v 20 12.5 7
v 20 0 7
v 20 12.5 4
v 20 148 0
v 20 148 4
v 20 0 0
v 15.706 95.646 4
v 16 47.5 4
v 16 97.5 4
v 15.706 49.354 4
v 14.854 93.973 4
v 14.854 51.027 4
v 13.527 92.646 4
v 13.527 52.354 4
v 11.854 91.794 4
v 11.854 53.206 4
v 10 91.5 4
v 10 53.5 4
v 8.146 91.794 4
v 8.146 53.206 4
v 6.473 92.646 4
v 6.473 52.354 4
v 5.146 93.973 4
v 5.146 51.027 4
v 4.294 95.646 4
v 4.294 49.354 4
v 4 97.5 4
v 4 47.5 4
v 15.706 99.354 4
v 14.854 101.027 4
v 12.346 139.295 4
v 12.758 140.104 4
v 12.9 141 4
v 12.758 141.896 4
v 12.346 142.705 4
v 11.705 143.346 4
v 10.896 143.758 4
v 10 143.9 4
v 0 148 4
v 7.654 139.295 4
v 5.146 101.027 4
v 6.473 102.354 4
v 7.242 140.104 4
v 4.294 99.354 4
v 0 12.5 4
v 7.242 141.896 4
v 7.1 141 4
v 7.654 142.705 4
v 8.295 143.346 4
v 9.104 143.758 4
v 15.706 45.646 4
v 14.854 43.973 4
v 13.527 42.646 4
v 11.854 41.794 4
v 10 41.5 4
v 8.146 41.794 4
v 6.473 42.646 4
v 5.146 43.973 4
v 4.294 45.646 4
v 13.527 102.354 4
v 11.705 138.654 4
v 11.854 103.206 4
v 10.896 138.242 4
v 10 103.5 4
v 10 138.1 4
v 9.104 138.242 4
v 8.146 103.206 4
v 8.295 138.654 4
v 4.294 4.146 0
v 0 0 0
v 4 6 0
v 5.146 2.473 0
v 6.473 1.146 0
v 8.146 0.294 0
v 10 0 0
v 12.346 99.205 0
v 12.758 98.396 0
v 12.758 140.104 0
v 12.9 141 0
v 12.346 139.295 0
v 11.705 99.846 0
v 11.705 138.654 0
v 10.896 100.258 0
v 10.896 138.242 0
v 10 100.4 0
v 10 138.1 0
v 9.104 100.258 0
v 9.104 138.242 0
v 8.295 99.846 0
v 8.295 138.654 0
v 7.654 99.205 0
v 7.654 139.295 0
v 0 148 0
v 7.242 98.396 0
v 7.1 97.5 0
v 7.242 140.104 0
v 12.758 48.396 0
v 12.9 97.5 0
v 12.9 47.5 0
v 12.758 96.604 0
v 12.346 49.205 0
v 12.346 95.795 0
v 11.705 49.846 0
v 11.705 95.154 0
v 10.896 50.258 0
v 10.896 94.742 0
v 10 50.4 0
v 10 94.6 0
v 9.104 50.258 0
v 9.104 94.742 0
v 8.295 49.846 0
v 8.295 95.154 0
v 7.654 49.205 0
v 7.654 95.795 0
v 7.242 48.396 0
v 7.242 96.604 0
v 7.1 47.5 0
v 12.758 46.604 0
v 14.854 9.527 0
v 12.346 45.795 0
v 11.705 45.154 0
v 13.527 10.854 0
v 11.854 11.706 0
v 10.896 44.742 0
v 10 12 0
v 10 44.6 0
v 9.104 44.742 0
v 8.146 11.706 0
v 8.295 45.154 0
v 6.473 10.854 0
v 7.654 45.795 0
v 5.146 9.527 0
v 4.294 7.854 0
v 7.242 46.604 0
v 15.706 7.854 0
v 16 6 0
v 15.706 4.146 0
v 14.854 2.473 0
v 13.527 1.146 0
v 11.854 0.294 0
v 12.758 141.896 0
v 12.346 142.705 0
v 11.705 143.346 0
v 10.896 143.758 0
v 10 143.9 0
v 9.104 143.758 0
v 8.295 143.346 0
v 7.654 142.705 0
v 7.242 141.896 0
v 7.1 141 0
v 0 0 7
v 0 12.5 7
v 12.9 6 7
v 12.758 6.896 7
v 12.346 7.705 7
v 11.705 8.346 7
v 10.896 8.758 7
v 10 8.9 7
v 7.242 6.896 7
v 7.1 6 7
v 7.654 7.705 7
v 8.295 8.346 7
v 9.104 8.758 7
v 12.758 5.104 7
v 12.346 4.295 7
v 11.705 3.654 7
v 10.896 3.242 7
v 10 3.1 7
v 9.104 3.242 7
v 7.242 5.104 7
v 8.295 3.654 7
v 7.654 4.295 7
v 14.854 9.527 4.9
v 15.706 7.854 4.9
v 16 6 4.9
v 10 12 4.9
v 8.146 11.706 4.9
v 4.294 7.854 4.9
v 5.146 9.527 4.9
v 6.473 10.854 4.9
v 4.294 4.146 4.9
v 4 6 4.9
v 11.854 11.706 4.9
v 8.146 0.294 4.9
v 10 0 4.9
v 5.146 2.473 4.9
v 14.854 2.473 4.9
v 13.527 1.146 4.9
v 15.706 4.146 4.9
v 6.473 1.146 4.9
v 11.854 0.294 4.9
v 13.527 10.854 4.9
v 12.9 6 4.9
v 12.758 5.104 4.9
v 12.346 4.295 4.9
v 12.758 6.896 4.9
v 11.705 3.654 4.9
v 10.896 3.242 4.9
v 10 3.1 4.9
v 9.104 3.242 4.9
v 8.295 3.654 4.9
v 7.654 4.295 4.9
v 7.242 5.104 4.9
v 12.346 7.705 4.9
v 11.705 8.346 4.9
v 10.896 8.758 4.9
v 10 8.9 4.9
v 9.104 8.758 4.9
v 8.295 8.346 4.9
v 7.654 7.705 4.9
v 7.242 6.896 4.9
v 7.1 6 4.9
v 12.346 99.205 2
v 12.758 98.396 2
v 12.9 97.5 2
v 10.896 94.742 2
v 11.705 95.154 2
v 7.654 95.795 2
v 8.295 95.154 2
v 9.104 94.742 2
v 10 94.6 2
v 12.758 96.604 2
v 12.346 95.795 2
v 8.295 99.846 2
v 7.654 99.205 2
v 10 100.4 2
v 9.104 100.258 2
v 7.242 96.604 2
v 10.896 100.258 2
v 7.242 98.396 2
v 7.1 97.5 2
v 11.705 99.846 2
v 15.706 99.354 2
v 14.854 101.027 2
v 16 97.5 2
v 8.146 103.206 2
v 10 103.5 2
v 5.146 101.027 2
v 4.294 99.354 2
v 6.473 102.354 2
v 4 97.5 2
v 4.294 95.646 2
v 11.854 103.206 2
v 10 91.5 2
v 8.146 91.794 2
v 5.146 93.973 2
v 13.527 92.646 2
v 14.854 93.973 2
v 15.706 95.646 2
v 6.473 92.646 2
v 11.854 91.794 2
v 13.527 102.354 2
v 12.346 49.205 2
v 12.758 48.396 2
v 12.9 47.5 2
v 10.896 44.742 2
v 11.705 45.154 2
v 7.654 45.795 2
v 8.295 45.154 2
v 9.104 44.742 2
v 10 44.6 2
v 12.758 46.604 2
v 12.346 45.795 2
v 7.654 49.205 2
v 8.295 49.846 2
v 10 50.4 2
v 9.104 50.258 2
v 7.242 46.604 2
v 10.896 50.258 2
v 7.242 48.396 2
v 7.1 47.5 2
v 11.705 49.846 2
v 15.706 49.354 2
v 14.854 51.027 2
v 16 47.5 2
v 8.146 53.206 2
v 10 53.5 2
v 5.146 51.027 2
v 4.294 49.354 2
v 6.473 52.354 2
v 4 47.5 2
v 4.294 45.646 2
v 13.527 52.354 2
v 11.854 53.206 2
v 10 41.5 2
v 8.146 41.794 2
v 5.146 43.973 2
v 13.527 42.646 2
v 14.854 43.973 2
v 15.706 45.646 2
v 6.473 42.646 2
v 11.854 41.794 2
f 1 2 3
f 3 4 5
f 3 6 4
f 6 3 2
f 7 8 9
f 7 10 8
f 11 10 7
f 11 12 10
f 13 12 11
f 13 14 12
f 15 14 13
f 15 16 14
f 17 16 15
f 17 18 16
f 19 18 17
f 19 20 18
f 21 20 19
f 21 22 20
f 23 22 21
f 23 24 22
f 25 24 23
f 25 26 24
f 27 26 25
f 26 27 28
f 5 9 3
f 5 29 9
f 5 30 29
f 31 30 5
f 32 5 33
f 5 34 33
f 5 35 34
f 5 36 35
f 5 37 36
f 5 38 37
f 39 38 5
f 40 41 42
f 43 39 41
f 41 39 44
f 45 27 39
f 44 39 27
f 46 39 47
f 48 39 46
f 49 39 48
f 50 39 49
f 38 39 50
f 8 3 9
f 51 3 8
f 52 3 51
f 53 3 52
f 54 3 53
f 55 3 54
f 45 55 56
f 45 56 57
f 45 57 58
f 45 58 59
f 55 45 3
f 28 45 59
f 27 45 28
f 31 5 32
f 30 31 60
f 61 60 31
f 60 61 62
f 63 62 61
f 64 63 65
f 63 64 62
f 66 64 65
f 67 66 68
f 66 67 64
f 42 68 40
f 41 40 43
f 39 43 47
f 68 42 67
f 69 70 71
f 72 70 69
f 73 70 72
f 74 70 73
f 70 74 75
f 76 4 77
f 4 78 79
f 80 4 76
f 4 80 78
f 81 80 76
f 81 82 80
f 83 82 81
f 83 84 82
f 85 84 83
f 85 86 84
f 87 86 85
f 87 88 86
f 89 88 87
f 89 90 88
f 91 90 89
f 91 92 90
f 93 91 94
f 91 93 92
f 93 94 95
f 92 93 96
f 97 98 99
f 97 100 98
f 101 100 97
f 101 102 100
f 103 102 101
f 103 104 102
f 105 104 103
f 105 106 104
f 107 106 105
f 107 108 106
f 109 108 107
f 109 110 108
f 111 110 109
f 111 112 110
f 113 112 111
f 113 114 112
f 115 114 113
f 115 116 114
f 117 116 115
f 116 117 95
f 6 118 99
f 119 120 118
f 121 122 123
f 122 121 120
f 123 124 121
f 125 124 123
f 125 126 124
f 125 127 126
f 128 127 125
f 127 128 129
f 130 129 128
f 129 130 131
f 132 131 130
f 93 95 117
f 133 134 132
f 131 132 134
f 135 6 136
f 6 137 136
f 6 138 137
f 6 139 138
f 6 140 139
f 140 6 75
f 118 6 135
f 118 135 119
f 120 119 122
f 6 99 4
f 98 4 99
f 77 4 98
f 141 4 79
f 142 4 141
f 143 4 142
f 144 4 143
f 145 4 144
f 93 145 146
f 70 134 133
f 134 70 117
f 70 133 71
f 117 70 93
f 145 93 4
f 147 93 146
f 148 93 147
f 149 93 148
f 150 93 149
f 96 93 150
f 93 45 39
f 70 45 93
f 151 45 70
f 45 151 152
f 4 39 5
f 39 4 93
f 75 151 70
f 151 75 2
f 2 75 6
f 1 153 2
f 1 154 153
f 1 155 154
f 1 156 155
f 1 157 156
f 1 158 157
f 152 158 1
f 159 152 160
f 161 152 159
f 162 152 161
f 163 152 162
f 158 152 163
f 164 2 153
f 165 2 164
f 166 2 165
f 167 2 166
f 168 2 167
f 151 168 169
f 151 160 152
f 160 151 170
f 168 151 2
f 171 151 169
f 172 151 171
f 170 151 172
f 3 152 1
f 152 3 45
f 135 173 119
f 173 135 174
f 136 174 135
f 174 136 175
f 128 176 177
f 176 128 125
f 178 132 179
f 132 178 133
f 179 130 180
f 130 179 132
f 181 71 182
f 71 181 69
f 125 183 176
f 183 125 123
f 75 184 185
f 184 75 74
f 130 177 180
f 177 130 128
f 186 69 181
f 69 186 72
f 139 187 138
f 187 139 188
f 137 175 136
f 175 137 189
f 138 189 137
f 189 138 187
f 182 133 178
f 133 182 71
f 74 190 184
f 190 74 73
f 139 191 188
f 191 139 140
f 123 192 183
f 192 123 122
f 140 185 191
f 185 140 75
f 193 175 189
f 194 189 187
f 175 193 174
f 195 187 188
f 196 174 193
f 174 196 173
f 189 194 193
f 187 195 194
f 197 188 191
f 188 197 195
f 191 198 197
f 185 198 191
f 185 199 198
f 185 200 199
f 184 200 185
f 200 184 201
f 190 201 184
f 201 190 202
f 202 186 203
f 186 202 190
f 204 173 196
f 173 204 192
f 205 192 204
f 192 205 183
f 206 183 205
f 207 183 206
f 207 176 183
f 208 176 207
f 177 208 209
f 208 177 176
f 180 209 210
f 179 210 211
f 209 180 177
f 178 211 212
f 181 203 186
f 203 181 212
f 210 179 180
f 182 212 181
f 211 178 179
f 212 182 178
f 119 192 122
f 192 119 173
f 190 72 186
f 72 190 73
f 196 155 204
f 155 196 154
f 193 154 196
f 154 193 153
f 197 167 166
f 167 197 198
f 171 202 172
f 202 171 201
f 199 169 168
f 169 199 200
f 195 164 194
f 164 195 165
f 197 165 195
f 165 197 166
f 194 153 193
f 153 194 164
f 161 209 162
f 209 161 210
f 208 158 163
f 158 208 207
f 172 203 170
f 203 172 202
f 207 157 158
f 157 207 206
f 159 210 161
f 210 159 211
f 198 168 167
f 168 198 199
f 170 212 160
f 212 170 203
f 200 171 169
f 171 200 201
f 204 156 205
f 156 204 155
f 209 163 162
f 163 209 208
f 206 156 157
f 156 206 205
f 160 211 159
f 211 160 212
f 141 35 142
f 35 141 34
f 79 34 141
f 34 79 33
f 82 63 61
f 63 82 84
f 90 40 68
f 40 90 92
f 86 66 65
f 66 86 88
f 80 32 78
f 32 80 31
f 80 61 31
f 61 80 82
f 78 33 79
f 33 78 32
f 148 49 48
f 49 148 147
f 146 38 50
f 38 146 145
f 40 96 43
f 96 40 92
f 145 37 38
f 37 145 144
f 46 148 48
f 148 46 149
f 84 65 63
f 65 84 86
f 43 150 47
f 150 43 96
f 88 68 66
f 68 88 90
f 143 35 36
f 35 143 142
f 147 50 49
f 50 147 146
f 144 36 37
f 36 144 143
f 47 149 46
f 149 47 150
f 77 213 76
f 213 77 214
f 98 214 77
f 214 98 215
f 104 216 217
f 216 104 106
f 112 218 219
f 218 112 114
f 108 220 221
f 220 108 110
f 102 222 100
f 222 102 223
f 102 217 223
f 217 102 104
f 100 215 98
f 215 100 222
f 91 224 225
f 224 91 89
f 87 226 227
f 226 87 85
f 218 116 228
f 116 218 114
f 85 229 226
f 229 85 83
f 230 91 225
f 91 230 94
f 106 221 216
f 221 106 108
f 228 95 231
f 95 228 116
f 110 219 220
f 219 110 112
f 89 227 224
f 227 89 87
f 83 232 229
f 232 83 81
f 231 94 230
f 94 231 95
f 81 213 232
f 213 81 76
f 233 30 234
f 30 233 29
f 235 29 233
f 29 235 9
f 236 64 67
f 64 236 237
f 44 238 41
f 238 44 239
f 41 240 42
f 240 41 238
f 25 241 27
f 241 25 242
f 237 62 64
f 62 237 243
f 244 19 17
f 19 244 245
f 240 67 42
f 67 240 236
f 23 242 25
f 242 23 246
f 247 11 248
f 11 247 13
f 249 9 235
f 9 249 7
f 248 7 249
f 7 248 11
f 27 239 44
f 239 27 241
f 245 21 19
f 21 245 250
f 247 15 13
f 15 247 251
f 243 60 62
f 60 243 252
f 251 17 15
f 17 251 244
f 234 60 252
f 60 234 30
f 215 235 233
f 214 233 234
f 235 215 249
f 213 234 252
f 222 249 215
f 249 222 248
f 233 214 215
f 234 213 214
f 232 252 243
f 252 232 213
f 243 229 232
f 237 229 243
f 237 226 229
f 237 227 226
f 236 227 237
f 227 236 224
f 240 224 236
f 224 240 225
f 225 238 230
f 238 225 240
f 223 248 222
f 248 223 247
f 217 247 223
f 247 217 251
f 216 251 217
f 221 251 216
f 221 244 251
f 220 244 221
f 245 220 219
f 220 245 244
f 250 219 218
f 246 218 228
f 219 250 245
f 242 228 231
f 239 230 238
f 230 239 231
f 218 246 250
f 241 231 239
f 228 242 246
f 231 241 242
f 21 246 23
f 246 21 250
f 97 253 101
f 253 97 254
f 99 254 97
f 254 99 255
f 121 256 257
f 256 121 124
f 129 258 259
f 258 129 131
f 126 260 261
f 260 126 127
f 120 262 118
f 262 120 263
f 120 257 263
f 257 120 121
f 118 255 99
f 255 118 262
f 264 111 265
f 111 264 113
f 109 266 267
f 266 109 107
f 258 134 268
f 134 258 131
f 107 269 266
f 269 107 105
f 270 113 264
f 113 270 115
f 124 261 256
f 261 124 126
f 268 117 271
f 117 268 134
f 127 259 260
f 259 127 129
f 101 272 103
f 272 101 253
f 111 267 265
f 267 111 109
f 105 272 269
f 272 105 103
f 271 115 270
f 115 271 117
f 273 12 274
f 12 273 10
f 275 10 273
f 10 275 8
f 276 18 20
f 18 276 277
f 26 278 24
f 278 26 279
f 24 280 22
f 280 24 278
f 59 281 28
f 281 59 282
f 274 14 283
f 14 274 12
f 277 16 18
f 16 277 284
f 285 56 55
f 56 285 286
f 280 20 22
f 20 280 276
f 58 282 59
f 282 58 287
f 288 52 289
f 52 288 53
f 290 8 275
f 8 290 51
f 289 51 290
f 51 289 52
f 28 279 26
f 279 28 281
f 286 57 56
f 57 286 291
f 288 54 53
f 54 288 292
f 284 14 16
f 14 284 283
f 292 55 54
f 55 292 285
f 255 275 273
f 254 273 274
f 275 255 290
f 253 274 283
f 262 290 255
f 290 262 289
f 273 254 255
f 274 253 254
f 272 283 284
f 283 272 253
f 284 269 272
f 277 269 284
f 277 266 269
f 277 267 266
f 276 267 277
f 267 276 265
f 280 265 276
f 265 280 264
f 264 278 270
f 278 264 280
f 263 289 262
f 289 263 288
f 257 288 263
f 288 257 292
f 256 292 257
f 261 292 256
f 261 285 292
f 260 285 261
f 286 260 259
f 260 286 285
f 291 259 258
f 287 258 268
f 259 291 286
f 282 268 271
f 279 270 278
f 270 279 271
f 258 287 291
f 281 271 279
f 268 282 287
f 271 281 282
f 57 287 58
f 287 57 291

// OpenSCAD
//psu_cover_switched_openscader();

psu_clamp();

module psu_clamp(){
difference(){
union(){
cube([20,148,4]);
cube([20,12.5,4+3]);
}
g = 6;
translate([10,g,-0.1])cylinder(r=12/2,h=5,$fn=20);
translate([10,g,-5])cylinder(r=5.8/2,h=30,$fn=20);
#translate([10,g+125+10,-5])cylinder(r=5.8/2,h=30,$fn=20);
translate([10,((145)/2)+25,-5])cylinder(r=5.8/2,h=30,$fn=20);
translate([10,((145)/2)+25,2])#cylinder(r=12/2,h=2,$fn=20);
translate([10,((145)/2)-25,-5])cylinder(r=5.8/2,h=30,$fn=20);
translate([10,((145)/2)-25,2])cylinder(r=12/2,h=2,$fn=20);
}
}

module psu_cover_switched_openscader(){
//#rotate([90,0,0])import("PSU_Fused_Switch_Cover.stl");
difference(){
union(){
translate([-59,-33,0])color("pink")cube([118,74,2]);
translate([-59,-33,0])color("pink")cube([2,74+5,2+53]);
translate([-59+116,-33,0])color("pink")cube([2,74+5,2+53]);
translate([-59,-33,0])color("pink")cube([118,2,2+50]);
}
translate([0,-18,-1])#cube([43,28,20]);
translate([0+6,-18+6.5,-1])#cube([43,15,20]);
translate([40+4,-18+4.8+0.25,-1])rotate([0,0,15])cylinder(r=11/2,$fn=3,h=5);
translate([40+4,-18+4.8+18.12,-1])rotate([0,0,-15])cylinder(r=11/2,$fn=3,h=5);
translate([40+4-19,-18+4.8+18.12+11,-8])rotate([0,0,-15])cylinder(r=3/2,$fn=30,h=30);
translate([40+4-19,-18+4.8+18.12+11-40,-8])rotate([0,0,-15])cylinder(r=3/2,$fn=30,h=30);
/*
for(i=[0:40]){
translate([40+4-19-33,-18+4.8+18.12+11-i,-8])rotate([0,0,-15])cylinder(r=4/2,$fn=30,h=30);
translate([40+4-19-33-9,-18+4.8+18.12+11-i,-8])rotate([0,0,-15])cylinder(r=4/2,$fn=30,h=30);
translate([40+4-19-33-18,-18+4.8+18.12+11-i,-8])rotate([0,0,-15])cylinder(r=4/2,$fn=30,h=30);
translate([40+4-19-33-26,-18+4.8+18.12+11-i,-8])rotate([0,0,-15])cylinder(r=4/2,$fn=30,h=30);
translate([40+4-19-33-35,-18+4.8+18.12+11-i,-8])rotate([0,0,-15])cylinder(r=4/2,$fn=30,h=30);
translate([40+4-19-33-44,-18+4.8+18.12+11-i,-8])rotate([0,0,-15])cylinder(r=4/2,$fn=30,h=30);

}
*/

for(i=[0,40]){
for(x=[0:5]){
translate([40+4-19-34.5-(x*8.8),-18+4.8+18.12+11-30-10,-8+5])rotate([0,0,0])cube([3,40,10]);
translate([40+4-19-33-(x*8.8),-18+4.8+18.12+11-i,-8])rotate([0,0,-15])cylinder(r=4/2,$fn=30,h=30);
}
}


#translate([40+4-19-100,-18+4.8+18.12+11+18+5,-8+48+9])rotate([0,90,0])cylinder(r=6/2,$fn=30,h=230);

}
}
//translate([-56.5,20,5])color("pink")cube([113,215,50]);
